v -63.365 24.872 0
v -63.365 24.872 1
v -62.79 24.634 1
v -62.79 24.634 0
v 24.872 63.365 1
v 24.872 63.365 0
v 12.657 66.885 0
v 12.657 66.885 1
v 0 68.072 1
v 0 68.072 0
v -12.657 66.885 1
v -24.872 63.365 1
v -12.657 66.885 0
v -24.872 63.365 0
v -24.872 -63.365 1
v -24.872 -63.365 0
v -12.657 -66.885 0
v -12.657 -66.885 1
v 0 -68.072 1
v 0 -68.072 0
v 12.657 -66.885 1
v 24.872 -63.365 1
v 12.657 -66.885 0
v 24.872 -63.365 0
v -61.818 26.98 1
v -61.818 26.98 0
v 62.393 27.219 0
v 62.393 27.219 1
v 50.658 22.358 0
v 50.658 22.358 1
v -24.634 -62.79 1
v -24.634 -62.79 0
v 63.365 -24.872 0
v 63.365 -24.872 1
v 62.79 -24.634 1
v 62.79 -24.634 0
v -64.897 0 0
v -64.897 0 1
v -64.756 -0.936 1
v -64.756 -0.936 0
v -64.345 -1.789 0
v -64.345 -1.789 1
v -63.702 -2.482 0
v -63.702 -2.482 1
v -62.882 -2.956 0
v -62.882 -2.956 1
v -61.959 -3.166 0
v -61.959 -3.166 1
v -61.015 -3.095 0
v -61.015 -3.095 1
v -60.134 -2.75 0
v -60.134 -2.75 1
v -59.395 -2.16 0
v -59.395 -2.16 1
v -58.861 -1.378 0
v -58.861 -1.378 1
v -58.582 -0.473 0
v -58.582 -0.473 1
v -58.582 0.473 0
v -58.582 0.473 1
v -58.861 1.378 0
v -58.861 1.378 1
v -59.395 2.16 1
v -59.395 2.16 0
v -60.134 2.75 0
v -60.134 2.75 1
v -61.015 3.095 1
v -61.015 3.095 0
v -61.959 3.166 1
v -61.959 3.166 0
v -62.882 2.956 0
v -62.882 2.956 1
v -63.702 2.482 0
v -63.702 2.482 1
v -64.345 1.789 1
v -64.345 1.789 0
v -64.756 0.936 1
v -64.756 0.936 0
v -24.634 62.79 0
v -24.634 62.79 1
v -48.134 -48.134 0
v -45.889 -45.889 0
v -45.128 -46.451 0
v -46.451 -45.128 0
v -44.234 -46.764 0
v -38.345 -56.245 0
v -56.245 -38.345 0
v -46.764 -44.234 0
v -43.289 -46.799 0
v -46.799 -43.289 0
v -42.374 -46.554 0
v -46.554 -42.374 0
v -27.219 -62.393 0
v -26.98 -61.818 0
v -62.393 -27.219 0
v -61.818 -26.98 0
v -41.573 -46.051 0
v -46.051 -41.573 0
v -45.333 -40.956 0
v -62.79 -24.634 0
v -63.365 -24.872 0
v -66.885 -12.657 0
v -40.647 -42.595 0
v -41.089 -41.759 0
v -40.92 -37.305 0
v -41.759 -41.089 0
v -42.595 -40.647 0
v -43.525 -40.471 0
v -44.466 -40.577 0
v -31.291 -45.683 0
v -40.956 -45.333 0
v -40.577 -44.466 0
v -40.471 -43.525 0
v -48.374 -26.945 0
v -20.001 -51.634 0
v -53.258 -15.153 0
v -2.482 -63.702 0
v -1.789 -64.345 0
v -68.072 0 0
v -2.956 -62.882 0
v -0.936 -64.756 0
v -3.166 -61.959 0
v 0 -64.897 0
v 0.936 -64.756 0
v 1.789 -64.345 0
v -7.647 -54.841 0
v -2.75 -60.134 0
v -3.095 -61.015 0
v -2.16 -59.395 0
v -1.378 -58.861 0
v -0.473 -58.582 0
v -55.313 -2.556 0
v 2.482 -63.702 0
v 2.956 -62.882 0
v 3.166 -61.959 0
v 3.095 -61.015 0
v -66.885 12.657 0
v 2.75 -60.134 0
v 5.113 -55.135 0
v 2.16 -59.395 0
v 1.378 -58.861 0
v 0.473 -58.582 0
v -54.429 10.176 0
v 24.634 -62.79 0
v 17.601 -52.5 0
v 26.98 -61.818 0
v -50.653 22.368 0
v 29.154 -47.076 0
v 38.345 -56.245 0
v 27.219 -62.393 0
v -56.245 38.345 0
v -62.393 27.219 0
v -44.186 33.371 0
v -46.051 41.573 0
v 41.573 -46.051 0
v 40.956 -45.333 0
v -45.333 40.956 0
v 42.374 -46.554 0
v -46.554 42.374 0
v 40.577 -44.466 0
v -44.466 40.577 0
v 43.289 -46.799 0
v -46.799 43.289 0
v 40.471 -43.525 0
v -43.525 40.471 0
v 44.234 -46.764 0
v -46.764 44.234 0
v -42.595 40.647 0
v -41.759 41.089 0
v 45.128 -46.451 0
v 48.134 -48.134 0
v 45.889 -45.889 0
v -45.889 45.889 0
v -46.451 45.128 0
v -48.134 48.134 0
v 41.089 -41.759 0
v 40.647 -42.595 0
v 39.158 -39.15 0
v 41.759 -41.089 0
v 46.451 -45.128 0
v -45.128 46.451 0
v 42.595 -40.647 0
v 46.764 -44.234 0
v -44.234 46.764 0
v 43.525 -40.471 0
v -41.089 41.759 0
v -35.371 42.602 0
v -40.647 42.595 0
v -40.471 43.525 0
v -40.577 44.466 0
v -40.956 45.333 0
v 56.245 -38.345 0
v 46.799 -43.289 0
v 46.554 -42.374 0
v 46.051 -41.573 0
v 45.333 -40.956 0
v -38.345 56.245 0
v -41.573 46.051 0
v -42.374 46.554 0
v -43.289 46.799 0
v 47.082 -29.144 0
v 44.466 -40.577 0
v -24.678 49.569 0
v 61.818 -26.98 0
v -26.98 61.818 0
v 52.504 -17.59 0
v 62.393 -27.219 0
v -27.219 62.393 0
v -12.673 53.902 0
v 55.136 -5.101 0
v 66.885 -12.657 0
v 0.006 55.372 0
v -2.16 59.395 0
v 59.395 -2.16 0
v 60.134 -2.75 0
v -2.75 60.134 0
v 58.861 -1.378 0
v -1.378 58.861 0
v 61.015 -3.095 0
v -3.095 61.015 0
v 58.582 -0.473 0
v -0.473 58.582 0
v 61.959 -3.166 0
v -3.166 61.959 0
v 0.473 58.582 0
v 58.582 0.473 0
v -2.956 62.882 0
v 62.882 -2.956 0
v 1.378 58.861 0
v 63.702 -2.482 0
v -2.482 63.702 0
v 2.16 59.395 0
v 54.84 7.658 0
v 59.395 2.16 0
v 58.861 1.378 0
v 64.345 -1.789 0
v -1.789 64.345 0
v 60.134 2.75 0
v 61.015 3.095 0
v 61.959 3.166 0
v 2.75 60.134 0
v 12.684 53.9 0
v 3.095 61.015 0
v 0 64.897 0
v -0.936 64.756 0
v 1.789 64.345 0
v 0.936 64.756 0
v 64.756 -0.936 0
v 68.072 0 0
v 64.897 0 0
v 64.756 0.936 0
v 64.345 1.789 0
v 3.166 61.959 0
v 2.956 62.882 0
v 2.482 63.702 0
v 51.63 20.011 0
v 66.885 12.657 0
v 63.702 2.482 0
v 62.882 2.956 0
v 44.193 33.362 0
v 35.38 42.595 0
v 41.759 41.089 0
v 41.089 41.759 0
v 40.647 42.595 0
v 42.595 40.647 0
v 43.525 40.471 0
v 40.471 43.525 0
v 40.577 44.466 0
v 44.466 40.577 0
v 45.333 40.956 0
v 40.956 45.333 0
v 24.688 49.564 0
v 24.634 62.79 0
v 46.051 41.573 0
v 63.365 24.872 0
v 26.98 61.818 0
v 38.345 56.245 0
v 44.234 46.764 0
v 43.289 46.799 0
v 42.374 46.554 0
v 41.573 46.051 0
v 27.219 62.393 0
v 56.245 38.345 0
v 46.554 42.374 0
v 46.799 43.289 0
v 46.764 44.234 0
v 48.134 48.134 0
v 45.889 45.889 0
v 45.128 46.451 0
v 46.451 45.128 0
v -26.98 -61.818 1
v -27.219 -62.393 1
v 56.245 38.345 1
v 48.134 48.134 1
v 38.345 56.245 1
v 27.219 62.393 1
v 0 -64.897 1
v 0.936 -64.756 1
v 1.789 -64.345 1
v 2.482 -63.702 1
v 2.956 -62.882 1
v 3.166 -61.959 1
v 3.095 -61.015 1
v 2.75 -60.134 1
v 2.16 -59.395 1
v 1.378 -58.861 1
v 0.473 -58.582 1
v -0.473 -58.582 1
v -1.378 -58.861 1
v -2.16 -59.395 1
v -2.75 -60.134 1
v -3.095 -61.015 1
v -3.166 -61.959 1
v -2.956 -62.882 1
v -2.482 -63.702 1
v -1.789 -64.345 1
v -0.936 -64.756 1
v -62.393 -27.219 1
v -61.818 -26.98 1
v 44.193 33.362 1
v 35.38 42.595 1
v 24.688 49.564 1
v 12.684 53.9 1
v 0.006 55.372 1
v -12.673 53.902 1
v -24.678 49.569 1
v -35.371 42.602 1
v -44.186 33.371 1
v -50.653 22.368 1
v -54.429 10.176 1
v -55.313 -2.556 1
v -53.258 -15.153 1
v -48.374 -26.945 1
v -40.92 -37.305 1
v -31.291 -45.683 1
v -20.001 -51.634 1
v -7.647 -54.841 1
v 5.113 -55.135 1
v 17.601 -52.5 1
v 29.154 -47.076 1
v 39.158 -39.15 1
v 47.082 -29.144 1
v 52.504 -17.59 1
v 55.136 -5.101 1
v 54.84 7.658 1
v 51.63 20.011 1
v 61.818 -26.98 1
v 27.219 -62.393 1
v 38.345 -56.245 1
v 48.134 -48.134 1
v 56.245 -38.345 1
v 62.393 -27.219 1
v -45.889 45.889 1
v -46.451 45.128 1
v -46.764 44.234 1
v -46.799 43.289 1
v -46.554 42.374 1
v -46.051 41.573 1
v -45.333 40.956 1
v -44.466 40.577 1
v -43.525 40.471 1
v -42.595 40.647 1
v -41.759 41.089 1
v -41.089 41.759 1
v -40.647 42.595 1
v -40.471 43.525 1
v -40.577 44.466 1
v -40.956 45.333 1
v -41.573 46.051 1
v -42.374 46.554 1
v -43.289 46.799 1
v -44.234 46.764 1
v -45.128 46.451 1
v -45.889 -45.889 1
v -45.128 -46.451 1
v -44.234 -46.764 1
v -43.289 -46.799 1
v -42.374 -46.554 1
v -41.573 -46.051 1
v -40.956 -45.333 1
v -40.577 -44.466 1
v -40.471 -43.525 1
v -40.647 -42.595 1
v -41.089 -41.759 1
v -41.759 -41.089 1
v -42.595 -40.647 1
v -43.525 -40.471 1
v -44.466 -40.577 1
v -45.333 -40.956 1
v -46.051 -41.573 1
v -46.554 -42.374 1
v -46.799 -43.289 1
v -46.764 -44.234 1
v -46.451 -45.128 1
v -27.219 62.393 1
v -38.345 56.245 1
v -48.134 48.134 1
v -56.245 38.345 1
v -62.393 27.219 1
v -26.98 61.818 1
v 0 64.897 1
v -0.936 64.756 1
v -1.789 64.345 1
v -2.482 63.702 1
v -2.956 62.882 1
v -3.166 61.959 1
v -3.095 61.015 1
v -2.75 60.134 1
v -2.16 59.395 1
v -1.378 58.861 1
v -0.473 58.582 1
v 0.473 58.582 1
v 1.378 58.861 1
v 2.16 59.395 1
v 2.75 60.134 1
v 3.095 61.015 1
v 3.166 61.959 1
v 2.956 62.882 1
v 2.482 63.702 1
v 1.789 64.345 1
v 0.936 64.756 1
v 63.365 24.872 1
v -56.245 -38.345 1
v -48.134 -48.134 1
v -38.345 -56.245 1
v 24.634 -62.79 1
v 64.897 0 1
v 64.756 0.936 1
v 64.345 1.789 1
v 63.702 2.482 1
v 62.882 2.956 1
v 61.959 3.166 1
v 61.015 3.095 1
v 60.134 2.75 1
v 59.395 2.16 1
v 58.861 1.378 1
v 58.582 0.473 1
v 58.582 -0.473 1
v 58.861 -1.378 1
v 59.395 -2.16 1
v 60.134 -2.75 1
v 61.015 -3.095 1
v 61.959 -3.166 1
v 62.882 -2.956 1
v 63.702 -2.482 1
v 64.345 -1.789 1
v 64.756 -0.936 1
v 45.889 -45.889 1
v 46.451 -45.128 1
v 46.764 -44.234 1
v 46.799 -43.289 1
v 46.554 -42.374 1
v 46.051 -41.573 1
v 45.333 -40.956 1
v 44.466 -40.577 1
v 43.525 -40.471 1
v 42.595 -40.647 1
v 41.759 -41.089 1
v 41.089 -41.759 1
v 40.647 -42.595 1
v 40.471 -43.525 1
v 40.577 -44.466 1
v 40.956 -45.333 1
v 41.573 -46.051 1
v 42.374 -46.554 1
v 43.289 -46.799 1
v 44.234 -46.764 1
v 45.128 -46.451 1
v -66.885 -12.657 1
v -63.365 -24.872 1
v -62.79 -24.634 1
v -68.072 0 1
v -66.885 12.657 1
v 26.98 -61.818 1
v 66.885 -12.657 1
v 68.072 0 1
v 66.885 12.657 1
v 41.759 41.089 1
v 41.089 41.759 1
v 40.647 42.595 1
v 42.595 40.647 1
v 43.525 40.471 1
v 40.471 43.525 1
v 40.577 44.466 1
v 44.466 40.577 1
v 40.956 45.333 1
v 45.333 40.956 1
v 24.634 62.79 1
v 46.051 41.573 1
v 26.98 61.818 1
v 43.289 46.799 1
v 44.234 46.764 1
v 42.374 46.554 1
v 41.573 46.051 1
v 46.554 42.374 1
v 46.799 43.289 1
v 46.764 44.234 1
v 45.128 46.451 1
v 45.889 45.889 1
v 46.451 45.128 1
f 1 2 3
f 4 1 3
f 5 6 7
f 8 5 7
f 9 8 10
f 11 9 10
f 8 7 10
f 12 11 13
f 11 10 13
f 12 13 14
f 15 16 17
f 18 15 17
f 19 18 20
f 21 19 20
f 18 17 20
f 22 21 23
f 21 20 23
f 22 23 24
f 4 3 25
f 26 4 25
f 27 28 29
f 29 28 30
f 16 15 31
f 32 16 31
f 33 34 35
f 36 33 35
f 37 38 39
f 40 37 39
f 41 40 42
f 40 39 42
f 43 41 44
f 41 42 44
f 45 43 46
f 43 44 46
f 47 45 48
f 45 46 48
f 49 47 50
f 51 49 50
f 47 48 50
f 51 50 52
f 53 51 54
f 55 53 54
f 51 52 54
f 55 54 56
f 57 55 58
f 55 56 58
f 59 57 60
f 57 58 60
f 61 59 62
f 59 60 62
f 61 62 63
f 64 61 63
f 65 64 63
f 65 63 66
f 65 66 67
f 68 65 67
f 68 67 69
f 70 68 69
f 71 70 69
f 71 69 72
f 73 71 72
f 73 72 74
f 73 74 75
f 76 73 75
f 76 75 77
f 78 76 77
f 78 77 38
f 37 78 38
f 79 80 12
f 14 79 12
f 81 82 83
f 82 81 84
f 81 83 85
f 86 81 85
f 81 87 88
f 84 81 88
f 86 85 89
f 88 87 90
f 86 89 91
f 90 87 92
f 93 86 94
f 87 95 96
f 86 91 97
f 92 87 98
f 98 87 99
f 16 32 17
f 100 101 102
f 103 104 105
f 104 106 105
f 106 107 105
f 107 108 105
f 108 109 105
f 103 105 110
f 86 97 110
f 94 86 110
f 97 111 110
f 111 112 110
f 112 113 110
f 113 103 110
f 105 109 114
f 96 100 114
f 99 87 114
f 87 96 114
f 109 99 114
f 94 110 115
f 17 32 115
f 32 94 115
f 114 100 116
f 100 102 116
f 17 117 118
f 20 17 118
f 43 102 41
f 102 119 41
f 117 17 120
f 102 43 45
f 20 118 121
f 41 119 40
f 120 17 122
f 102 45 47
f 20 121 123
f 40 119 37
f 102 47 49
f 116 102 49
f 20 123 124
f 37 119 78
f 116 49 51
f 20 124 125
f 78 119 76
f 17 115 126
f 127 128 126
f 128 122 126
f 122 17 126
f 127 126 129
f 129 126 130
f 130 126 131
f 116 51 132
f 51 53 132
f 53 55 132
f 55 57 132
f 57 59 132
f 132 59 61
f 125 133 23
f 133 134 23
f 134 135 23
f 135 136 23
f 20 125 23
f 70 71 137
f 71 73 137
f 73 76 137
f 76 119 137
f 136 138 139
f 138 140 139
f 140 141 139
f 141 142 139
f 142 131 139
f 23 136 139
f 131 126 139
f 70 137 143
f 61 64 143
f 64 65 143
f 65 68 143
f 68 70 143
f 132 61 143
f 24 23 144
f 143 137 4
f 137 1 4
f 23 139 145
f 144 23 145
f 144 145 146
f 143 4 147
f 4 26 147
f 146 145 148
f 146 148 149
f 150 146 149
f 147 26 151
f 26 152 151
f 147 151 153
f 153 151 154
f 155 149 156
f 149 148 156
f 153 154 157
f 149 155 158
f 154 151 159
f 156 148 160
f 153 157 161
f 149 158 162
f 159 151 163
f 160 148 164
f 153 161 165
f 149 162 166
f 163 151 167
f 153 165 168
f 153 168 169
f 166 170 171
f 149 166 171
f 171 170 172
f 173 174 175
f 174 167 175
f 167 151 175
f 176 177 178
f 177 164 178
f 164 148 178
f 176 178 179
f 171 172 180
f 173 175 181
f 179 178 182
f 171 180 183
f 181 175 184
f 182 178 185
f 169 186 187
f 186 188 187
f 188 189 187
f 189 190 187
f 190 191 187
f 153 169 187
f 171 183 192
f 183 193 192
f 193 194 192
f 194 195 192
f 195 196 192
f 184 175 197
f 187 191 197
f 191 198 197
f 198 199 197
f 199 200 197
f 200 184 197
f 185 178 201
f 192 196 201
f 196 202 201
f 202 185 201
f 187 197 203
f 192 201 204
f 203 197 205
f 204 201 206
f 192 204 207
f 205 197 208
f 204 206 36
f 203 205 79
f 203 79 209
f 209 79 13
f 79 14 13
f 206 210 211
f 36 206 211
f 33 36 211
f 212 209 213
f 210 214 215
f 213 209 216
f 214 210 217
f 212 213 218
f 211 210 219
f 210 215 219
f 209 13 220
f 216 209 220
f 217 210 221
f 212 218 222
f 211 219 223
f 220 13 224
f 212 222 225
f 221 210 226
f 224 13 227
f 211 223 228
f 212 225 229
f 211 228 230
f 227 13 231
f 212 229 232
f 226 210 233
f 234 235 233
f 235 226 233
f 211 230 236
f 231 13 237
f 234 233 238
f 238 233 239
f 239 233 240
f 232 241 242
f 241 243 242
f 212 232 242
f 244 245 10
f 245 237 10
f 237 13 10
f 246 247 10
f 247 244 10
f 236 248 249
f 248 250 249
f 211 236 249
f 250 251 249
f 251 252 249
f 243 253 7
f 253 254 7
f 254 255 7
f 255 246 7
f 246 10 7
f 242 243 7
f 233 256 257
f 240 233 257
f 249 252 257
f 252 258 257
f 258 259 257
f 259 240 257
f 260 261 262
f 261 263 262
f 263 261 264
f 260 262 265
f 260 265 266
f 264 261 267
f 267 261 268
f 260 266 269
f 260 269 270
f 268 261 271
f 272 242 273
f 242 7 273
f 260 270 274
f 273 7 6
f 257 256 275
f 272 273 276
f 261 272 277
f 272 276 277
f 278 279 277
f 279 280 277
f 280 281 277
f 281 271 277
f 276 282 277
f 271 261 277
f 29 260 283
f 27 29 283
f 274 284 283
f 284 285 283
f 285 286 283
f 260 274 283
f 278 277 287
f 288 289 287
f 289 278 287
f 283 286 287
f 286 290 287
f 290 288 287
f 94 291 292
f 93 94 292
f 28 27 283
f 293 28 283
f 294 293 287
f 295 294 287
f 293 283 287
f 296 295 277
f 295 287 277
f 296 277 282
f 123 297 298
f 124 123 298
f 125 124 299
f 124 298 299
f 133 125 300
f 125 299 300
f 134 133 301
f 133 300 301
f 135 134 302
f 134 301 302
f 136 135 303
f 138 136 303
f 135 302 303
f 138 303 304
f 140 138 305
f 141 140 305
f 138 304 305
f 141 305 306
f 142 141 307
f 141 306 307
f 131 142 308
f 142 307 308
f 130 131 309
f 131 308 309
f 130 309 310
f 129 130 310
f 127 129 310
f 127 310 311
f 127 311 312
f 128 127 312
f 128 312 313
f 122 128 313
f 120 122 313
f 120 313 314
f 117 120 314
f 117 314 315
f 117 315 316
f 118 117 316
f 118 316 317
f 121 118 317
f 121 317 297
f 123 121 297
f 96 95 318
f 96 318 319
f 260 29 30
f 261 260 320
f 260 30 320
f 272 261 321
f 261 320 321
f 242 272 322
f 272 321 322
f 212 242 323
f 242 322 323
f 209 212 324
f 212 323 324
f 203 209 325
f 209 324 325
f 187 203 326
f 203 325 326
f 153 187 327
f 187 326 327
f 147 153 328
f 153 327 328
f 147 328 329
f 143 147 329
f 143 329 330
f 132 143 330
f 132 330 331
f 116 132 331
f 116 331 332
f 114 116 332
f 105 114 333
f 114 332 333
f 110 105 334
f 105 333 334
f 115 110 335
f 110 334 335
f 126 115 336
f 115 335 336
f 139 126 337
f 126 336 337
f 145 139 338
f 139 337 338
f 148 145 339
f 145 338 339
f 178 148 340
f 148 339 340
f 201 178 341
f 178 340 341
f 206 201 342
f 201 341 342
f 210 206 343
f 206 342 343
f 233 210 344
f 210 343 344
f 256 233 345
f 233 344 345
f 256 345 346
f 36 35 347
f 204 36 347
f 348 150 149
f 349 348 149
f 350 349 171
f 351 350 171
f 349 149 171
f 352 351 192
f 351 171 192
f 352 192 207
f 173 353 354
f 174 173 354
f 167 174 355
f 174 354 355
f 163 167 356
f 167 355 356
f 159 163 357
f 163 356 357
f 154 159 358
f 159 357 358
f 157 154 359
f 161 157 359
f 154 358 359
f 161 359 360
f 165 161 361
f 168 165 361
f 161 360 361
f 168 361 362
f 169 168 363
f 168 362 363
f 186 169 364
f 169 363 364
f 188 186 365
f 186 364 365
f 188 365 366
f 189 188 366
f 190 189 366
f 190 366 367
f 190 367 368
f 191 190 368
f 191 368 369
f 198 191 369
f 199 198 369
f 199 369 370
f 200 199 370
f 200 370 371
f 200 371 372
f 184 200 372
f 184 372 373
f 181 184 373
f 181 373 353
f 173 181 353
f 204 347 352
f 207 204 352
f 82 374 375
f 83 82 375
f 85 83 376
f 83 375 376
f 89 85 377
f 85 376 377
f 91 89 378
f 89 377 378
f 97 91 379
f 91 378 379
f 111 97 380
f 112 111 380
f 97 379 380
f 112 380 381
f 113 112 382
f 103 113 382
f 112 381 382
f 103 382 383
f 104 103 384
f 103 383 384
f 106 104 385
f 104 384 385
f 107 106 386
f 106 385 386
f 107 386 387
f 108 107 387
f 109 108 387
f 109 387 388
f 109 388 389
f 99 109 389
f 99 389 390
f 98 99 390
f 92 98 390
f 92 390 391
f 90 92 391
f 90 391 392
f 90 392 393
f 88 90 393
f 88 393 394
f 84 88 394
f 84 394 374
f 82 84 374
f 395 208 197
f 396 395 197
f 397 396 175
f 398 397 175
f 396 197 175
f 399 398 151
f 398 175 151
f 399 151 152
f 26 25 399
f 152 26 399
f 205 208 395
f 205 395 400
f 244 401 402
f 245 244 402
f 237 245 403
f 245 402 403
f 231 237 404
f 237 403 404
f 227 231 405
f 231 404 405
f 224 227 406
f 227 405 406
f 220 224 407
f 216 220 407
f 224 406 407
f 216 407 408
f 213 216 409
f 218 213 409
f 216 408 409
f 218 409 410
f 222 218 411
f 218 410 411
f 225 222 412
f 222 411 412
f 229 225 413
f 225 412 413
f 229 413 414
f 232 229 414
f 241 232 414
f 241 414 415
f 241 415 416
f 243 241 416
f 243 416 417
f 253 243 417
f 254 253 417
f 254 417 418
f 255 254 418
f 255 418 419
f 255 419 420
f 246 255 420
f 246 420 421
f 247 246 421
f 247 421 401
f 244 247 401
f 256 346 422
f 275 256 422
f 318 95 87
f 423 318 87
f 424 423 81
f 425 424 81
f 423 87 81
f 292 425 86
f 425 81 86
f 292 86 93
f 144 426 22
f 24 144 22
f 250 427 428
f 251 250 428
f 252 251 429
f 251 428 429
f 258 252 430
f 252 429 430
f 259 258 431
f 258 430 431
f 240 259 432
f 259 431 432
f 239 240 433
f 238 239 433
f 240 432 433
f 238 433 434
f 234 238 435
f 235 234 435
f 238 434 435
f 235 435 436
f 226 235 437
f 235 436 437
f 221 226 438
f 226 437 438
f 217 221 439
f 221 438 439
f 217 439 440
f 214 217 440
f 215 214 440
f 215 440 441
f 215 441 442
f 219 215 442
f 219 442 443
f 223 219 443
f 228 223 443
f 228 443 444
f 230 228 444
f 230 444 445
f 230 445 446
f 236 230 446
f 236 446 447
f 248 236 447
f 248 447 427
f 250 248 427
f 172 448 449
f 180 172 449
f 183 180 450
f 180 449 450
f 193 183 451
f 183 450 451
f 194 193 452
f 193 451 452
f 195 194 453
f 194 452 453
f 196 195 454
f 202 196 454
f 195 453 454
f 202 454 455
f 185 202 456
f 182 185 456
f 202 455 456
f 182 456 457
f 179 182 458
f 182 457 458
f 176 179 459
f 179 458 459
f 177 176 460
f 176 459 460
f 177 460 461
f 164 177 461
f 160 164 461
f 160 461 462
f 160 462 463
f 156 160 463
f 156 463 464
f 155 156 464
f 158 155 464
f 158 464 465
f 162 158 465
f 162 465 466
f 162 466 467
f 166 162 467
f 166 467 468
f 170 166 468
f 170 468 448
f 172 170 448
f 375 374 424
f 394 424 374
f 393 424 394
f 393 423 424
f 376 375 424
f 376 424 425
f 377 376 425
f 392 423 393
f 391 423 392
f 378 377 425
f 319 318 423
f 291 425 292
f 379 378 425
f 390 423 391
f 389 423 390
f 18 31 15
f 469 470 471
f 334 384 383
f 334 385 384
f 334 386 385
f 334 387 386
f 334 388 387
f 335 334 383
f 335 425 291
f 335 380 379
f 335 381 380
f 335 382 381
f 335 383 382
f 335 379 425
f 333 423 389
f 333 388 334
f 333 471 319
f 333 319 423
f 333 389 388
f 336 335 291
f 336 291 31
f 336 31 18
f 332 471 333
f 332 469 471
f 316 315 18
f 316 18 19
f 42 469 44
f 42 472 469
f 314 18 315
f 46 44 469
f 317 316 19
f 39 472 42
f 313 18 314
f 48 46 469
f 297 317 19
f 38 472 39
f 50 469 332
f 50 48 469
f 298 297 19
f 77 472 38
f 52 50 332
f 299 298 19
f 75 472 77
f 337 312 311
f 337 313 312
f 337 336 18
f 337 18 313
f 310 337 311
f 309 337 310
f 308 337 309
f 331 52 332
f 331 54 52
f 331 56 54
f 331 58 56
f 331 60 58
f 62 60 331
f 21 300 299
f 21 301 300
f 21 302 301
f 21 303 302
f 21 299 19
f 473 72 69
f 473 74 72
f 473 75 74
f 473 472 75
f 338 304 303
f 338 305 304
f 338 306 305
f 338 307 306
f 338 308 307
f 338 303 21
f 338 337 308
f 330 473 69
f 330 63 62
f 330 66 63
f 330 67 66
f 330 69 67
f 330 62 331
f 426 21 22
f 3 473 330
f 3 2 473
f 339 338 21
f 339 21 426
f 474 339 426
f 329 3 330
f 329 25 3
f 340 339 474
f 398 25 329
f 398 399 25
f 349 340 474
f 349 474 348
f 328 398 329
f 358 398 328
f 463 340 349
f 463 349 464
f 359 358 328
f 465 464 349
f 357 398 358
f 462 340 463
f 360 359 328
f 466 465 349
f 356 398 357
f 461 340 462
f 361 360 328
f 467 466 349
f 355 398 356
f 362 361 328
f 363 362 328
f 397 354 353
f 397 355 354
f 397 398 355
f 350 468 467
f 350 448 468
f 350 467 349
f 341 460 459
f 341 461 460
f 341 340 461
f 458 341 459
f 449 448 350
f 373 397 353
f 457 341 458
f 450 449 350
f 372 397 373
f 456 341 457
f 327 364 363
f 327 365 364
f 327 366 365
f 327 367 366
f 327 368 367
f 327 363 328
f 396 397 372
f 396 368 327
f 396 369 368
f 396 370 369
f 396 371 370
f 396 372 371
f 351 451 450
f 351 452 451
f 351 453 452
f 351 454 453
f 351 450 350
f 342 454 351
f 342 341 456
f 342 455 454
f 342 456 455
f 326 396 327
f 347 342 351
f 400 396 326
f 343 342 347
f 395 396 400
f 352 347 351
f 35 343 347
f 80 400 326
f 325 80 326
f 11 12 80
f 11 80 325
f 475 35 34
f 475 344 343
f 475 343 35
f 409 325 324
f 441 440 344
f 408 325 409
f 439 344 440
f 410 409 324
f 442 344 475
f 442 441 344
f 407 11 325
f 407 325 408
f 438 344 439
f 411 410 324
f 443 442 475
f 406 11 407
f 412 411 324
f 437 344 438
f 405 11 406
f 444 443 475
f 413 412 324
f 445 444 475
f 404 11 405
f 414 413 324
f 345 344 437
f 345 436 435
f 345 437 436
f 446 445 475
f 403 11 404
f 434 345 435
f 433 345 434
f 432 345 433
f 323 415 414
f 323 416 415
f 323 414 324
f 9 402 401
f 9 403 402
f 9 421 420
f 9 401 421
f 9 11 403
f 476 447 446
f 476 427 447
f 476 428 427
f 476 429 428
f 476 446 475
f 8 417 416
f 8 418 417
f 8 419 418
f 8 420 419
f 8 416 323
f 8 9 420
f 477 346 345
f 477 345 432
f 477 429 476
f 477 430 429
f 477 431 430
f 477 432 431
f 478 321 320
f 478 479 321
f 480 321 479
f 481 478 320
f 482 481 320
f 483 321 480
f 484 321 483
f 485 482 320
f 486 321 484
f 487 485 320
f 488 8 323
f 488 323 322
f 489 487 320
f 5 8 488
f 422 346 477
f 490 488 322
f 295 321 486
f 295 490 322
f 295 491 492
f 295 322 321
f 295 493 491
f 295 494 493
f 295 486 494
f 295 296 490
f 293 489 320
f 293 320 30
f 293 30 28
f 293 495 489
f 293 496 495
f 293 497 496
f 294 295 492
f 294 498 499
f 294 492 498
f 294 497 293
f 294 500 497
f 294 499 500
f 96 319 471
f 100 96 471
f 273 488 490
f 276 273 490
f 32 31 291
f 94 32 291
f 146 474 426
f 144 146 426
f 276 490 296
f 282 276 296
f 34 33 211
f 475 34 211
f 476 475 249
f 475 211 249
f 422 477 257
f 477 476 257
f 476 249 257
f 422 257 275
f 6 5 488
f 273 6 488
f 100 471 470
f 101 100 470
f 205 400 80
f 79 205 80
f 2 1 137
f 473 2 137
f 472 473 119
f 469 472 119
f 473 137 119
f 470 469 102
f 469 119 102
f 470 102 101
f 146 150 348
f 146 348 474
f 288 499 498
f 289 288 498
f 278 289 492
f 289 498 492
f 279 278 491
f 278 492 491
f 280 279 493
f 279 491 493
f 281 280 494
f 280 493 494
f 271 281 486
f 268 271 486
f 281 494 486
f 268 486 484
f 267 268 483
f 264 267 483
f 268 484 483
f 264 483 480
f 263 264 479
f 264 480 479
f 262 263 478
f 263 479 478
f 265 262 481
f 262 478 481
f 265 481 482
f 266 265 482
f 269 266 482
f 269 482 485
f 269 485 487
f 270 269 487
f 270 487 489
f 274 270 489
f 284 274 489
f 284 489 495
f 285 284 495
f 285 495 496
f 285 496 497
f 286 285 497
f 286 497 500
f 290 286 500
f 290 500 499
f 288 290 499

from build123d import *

# Parameters (mm, degrees)
SKETCH4_R           = 68.072
BOSS_EXTRUDE2_DEPTH = 1
SKETCH5_R           = 55.372
CUT_EXTRUDE5_DEPTH  = 2
SKETCH6_R           = 3.175
CUT_EXTRUDE6_DEPTH  = 2
CIRPATTERN1_COUNT   = 8
CUT_EXTRUDE11_DEPTH = 2


with BuildPart() as part:
    # Sketch4 → Boss-Extrude2 (new body)
    with BuildSketch(Plane.XY):
        Circle(SKETCH4_R)
    extrude(amount=BOSS_EXTRUDE2_DEPTH)

    # Sketch5 → Cut-Extrude5 (cut, through all)
    with BuildSketch(Plane.XY.offset(1)):
        Circle(SKETCH5_R)
    extrude(amount=-CUT_EXTRUDE5_DEPTH, mode=Mode.SUBTRACT)

    # Sketch6 → Cut-Extrude6 (cut, through all)
    with BuildSketch(Plane.XY.offset(1)):
        with Locations((61.722, 0)):
            Circle(SKETCH6_R)
    cut_extrude6 = extrude(amount=-CUT_EXTRUDE6_DEPTH, mode=Mode.SUBTRACT)

    # CirPattern1: Cut-Extrude6 ×8 about axis
    cirpattern1_axis = Axis((0, 0, 0), (0, 0, 1))
    for i in range(1, CIRPATTERN1_COUNT):
        add(cut_extrude6.rotate(cirpattern1_axis, i * 360 / CIRPATTERN1_COUNT), mode=Mode.SUBTRACT)

    # Sketch8 → Cut-Extrude11 (cut, through all)
    with BuildSketch(Plane.XY.offset(1)):
        Polygon((65.924300597, 28.681377492), (47.151068496, 20.905250146), (48.123084414, 18.558596133), (66.896316515, 26.334723479), align=None)
        Polygon((27.466357594, 62.990983081), (25.119703581, 63.962998999), (24.633695622, 62.789671993), (26.980349635, 61.817656075), align=None)
        Polygon((-25.119703581, 63.962998999), (-27.466357594, 62.990983081), (-26.980349635, 61.817656075), (-24.633695622, 62.789671993), align=None)
        Polygon((-62.990983081, 27.466357594), (-63.962998999, 25.119703581), (-62.789671993, 24.633695622), (-61.817656075, 26.980349635), align=None)
        Polygon((-63.962998999, -25.119703581), (-62.990983081, -27.466357594), (-61.817656075, -26.980349635), (-62.789671993, -24.633695622), align=None)
        Polygon((-27.466357594, -62.990983081), (-25.119703581, -63.962998999), (-24.633695622, -62.789671993), (-26.980349635, -61.817656075), align=None)
        Polygon((25.119703581, -63.962998999), (27.466357594, -62.990983081), (26.980349635, -61.817656075), (24.633695622, -62.789671993), align=None)
        Polygon((62.990983081, -27.466357594), (63.962998999, -25.119703581), (62.789671993, -24.633695622), (61.817656075, -26.980349635), align=None)
    extrude(amount=-CUT_EXTRUDE11_DEPTH, mode=Mode.SUBTRACT)


solid = part.part
